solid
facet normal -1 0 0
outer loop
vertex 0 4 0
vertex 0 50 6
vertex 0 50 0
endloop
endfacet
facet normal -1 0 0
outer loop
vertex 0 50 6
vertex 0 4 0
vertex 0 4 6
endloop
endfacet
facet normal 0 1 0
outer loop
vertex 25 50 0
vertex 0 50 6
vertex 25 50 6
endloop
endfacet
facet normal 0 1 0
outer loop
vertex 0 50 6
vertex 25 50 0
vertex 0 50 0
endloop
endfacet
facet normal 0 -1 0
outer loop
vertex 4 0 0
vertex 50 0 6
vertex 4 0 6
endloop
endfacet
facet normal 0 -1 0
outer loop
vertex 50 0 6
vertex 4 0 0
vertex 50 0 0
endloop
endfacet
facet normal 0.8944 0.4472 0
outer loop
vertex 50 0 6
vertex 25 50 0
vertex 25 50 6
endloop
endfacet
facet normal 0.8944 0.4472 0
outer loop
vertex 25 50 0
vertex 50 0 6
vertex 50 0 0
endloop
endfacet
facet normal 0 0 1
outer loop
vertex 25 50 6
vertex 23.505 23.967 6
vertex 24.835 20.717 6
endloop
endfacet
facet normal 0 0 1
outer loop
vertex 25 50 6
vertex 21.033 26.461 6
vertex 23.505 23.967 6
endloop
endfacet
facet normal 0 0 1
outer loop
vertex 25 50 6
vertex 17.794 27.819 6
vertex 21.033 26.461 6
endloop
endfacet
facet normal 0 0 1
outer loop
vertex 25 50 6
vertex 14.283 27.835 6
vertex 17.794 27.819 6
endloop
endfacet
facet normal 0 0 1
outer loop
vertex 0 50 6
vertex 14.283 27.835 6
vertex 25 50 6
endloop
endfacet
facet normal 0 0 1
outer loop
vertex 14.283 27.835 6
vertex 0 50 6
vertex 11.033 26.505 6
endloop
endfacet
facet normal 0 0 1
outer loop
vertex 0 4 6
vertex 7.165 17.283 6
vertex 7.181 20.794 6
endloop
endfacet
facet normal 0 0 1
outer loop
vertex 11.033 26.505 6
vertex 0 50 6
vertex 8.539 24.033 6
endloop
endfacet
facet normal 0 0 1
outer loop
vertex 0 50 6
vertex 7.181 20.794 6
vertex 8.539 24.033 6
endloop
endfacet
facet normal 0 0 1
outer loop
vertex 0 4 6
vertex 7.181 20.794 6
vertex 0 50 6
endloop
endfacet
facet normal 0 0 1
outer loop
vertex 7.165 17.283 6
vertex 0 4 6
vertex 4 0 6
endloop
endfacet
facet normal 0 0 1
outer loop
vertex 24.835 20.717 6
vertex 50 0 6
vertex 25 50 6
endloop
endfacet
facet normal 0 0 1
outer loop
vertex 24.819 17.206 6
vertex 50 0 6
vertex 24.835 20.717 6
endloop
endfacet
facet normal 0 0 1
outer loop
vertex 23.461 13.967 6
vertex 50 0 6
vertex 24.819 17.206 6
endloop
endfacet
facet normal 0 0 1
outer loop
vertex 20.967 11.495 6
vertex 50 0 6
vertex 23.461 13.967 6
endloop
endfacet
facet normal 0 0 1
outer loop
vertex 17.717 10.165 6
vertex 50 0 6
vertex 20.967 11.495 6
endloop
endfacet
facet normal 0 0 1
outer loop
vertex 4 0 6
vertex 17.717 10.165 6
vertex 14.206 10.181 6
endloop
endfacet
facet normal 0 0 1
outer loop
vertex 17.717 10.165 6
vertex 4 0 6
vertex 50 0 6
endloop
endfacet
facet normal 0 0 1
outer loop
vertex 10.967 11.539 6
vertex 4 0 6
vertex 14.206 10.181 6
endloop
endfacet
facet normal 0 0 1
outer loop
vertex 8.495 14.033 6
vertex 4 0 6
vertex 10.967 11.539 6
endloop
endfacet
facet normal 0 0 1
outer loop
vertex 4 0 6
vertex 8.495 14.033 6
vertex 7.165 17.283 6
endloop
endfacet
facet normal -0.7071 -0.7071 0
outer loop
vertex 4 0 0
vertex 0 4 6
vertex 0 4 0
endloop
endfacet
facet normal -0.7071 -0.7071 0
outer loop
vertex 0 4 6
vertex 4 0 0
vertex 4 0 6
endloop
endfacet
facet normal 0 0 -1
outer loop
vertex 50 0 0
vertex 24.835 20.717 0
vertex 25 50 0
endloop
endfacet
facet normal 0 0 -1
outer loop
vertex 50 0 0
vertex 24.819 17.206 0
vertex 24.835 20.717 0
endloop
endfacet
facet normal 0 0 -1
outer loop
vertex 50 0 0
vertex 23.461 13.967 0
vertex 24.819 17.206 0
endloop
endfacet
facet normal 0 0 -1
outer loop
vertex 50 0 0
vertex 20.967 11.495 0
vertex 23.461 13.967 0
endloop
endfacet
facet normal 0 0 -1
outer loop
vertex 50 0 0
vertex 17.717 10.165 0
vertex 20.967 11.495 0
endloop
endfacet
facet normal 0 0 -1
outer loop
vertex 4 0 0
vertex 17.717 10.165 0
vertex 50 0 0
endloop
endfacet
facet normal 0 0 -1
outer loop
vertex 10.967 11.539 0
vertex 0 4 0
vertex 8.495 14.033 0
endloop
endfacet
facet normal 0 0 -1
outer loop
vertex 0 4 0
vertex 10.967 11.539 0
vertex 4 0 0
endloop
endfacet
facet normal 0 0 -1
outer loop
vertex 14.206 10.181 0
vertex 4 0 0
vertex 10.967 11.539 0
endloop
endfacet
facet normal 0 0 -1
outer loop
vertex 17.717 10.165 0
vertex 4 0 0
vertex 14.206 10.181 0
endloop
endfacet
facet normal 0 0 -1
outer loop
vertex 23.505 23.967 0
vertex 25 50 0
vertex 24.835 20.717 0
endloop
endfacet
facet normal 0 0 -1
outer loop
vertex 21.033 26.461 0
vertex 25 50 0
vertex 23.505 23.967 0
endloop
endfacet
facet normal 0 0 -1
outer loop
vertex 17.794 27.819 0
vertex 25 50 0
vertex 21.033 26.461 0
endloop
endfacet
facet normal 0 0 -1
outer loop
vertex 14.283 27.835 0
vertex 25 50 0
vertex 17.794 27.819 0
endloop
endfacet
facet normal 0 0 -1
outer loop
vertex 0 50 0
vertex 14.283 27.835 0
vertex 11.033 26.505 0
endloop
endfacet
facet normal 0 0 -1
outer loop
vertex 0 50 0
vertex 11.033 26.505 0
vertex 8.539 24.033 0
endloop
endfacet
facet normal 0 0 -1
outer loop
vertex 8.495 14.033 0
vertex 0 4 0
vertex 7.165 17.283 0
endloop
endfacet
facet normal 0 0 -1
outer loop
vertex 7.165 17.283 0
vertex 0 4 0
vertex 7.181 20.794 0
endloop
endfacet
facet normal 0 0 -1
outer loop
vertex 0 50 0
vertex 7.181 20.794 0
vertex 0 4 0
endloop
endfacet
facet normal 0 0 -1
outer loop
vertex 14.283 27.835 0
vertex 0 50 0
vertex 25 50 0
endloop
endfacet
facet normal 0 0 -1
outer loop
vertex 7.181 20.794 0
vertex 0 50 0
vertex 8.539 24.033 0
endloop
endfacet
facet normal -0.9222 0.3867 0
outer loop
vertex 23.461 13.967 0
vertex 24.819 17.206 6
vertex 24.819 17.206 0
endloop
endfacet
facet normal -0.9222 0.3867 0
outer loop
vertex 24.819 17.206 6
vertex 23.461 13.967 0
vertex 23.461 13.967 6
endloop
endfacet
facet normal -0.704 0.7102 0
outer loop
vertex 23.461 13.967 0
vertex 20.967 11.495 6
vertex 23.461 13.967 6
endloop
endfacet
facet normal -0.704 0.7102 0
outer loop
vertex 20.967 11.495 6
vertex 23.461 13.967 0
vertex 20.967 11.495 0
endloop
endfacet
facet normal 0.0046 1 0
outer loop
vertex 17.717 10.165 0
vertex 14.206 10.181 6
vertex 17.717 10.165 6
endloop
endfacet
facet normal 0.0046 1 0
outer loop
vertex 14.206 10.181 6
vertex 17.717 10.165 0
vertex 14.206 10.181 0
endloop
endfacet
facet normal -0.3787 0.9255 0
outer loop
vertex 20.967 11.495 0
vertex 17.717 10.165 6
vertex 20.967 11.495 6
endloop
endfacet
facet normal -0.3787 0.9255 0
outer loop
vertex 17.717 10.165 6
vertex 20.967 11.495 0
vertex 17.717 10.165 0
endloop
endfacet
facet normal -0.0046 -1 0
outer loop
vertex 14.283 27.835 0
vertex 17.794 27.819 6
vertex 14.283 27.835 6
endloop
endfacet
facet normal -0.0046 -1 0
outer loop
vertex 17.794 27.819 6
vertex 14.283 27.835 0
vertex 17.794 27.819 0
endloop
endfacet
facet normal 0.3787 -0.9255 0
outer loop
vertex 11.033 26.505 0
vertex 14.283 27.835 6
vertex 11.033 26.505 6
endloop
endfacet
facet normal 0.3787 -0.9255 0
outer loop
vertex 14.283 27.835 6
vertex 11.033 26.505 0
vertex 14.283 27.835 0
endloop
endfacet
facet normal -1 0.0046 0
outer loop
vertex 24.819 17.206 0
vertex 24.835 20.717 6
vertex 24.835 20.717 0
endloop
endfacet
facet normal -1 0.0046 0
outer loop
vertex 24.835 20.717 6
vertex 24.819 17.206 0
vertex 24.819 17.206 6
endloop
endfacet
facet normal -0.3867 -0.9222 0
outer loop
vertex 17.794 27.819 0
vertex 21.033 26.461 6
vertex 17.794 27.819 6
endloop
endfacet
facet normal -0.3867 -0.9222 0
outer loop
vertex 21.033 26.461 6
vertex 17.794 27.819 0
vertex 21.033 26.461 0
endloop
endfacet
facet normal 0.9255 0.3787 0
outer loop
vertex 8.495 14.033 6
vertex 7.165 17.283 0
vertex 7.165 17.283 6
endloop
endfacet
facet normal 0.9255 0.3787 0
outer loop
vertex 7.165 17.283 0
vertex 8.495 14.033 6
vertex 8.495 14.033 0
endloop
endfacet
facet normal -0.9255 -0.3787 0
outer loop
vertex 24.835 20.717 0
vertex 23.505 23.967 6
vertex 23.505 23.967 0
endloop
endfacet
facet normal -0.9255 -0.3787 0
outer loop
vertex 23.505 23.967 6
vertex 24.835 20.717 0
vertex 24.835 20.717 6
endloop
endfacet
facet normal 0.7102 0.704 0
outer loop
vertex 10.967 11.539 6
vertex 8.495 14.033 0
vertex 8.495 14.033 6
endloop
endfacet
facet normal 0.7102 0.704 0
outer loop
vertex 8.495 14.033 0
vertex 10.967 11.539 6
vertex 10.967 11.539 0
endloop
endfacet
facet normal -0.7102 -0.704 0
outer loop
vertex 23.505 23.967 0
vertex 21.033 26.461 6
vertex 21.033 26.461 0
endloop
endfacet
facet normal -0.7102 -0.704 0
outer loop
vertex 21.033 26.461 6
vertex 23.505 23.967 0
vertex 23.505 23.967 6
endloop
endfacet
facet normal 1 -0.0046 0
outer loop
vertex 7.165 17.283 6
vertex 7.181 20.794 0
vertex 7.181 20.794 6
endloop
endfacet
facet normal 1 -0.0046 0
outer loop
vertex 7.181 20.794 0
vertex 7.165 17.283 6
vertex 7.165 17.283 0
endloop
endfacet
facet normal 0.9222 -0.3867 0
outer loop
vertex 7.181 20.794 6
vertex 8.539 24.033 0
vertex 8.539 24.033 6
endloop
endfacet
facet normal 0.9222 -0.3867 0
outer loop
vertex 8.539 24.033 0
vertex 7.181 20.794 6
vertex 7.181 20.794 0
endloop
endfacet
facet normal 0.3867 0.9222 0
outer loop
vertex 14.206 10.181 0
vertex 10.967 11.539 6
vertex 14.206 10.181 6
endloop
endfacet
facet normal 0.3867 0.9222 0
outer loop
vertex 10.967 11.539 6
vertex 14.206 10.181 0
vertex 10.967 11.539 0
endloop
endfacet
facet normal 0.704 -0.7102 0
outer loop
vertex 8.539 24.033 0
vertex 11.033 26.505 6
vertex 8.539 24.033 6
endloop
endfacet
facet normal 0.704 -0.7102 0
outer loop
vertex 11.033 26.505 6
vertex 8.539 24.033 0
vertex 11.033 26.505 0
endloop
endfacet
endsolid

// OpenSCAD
$fn = 32;

// ----------------------------------------------------------------------
// Bracket plate: gusset 50 x 50
// ----------------------------------------------------------------------

// --- parameters (mm) ---
hole_r = 3.5;             // bolt hole radius
plate_t = 6;              // plate thickness, Z (extrusion height)
gus_a = 50;               // base length
gus_b = 50;               // height
top_x = 25;               // top edge X of the angled cut
light_r = 9;              // lightening hole radius

light_d = 2 * light_r;

profile = [[4, 0], [25, 0], [50, 0], [25, 50], [0, 50], [0, 4]];  // primary outline, 6 points, counter clockwise
void_1 = [[24.835, 20.717], [23.505, 23.967], [21.033, 26.461], [17.794, 27.819], [14.283, 27.835], [11.033, 26.505], [8.539, 24.033], [7.181, 20.794], [7.165, 17.283], [8.495, 14.033], [10.967, 11.539], [14.206, 10.181], [17.717, 10.165], [20.967, 11.495], [23.461, 13.967], [24.819, 17.206]];  // lightening hole, 16 points

// --- the one profile operation ---
difference() {
  linear_extrude(height = plate_t) polygon(points = profile);
  translate([0, 0, -1])
    linear_extrude(height = plate_t + 2) polygon(points = void_1);
}
